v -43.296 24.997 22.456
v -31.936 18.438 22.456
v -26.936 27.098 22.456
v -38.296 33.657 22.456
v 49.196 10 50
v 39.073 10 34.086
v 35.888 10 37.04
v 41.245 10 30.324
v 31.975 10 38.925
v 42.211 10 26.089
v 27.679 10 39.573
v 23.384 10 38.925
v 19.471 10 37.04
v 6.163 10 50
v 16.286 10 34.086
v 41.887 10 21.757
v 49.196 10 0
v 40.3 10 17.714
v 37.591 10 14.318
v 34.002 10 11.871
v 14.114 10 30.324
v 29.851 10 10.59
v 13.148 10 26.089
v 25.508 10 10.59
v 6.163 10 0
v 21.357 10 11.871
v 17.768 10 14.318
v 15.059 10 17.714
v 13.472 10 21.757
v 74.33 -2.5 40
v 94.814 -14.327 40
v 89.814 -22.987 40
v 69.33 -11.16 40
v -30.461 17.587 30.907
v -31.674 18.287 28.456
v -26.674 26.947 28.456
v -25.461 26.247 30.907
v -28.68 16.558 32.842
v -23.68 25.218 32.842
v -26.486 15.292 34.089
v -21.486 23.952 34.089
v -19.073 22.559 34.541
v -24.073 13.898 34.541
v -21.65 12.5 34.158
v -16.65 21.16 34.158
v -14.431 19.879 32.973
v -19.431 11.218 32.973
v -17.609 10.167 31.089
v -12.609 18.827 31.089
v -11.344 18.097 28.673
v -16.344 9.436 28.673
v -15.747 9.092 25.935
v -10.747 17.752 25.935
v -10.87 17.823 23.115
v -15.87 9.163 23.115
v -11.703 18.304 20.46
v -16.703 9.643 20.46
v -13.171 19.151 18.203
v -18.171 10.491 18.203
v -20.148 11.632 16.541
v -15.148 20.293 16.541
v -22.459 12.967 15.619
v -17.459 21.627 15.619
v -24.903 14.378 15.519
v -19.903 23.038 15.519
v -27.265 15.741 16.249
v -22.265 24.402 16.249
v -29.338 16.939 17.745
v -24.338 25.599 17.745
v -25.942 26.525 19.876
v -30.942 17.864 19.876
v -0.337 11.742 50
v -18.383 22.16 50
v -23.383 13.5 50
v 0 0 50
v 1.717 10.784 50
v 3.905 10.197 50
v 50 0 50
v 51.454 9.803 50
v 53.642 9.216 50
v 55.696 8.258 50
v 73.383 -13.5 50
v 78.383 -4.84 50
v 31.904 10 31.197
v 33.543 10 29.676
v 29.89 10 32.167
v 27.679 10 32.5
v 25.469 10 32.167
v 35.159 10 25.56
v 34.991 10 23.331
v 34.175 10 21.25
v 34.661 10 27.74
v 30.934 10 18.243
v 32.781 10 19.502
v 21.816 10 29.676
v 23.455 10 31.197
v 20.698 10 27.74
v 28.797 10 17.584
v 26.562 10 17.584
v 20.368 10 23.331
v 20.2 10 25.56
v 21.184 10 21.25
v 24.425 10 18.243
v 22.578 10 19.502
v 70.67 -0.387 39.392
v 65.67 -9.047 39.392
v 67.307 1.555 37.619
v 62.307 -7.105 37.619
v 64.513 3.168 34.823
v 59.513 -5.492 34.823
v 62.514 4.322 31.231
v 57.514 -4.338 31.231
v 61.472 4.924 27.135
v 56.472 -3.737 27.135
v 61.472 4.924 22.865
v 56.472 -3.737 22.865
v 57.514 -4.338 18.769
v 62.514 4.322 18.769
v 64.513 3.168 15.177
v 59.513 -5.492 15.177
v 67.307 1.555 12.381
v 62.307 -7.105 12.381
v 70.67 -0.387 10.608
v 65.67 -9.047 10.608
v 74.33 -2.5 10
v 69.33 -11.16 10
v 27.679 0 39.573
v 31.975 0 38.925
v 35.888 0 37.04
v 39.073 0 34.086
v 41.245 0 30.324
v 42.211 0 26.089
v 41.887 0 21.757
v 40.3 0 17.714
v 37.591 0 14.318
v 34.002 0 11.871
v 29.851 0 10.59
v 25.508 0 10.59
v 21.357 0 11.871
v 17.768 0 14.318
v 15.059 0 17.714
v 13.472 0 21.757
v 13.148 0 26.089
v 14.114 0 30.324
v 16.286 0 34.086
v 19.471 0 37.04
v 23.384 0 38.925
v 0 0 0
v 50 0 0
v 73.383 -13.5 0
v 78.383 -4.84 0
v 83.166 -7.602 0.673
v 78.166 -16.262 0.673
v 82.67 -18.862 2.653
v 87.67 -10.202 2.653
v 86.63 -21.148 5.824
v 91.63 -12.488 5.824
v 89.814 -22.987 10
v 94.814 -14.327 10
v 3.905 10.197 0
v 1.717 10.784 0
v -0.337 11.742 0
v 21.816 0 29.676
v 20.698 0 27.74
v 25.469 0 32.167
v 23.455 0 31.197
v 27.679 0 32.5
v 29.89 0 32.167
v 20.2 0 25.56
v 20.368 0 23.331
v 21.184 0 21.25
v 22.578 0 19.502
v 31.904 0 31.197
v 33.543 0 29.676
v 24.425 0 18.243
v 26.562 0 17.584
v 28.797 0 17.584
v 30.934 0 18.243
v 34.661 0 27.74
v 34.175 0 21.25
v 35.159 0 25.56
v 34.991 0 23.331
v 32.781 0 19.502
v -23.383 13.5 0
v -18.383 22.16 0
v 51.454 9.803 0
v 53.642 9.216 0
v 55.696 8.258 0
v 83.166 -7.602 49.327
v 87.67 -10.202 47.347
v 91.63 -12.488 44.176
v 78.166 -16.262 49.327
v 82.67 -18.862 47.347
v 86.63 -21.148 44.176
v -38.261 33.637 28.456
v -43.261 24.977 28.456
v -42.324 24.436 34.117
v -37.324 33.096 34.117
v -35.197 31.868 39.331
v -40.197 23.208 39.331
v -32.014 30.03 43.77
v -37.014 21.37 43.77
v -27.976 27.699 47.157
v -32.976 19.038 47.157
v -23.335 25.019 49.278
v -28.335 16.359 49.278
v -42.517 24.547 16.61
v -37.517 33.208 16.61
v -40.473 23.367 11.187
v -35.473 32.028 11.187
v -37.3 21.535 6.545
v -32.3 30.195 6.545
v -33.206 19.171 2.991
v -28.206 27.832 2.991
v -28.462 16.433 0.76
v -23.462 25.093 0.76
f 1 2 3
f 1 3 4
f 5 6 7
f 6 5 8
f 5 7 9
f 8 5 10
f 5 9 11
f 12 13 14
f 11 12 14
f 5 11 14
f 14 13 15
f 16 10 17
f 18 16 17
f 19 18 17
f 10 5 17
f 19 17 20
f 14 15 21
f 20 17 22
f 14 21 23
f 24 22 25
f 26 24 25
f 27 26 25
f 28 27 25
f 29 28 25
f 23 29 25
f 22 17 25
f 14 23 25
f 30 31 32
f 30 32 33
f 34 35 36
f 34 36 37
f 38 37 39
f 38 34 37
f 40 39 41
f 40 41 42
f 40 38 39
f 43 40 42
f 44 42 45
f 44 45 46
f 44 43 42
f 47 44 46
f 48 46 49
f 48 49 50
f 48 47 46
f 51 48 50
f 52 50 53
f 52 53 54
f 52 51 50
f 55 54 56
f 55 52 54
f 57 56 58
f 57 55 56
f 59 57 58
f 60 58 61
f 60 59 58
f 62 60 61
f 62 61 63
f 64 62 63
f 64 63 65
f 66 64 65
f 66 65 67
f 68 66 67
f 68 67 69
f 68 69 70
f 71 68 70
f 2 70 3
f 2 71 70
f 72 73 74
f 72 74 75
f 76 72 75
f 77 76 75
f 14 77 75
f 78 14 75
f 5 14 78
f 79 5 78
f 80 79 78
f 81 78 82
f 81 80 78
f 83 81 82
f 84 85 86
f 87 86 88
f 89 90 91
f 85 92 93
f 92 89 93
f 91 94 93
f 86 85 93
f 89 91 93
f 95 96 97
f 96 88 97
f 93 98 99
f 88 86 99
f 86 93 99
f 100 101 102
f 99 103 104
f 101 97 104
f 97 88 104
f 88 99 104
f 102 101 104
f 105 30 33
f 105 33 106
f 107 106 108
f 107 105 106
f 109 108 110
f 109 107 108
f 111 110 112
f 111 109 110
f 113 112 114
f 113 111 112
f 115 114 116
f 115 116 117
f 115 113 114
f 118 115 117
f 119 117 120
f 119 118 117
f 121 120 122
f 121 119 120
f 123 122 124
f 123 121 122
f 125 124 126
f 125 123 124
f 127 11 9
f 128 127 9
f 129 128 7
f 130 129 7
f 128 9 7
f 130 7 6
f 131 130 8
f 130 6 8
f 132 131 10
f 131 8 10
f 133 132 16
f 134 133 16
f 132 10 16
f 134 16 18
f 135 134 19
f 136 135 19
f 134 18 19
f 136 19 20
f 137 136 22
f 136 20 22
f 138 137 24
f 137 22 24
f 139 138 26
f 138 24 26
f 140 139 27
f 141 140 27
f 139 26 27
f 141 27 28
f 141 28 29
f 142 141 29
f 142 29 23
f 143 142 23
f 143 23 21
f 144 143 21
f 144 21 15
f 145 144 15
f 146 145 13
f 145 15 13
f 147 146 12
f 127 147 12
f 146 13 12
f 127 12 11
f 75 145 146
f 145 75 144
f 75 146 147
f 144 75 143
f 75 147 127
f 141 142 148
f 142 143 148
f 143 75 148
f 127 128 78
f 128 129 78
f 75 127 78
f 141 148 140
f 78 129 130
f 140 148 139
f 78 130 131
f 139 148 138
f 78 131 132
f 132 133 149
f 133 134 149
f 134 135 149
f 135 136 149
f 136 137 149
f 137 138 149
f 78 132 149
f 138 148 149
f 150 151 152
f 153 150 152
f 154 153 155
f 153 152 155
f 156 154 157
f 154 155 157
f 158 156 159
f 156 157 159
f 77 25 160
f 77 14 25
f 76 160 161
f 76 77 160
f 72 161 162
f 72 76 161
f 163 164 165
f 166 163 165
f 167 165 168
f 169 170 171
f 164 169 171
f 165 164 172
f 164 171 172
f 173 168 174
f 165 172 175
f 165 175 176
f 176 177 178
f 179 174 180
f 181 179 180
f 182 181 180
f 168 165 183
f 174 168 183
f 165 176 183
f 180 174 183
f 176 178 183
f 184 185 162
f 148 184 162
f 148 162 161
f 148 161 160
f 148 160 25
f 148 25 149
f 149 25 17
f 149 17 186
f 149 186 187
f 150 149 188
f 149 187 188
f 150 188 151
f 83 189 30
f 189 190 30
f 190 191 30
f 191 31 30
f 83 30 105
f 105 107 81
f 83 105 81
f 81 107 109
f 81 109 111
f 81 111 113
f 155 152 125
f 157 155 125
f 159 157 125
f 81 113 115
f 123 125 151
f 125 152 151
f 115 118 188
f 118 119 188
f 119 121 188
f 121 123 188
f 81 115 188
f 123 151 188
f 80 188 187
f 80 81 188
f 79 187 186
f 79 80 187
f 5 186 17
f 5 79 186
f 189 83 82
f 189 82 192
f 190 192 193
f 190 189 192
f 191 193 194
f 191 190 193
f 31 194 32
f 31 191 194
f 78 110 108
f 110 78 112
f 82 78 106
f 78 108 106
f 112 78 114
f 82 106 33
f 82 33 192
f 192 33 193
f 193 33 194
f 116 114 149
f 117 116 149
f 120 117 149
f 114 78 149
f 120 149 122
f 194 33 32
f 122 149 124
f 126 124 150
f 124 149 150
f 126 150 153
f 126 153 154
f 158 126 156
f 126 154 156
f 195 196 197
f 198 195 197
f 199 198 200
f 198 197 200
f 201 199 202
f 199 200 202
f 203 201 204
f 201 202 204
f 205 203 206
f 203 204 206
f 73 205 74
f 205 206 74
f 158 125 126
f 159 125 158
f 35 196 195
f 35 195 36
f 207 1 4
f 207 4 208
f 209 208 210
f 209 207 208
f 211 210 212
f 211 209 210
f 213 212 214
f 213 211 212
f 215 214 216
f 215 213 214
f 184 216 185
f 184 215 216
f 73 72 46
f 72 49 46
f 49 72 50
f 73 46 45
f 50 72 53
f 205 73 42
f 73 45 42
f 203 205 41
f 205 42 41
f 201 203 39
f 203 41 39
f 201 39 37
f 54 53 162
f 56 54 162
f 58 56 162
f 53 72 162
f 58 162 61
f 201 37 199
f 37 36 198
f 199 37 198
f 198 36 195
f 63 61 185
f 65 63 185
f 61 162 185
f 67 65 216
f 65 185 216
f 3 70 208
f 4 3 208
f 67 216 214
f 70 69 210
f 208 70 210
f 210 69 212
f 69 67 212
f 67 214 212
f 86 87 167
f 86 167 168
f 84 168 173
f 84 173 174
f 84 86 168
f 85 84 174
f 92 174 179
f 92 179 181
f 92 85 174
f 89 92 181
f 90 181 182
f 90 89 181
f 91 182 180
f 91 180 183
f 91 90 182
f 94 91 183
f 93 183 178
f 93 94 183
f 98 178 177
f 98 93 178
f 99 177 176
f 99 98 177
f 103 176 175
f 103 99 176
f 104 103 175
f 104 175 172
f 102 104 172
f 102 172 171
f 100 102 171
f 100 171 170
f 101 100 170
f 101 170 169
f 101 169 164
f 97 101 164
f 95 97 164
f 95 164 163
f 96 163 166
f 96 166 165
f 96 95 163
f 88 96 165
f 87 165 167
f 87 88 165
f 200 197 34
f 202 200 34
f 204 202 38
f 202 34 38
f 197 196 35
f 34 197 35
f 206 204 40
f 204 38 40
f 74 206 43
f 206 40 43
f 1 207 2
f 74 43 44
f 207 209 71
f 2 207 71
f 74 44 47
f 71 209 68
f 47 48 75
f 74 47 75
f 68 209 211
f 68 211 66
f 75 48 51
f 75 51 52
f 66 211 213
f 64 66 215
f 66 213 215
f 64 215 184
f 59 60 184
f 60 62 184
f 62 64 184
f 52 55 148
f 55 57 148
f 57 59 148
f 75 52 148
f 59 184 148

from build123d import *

# Parameters (mm, degrees)
EXTRUDE_THIN1_DEPTH = 50
FILLET1_R           = 23
CUT_EXTRUDE1_START  = -10
SKETCH2_R           = 9.542038154
CUT_EXTRUDE1_DEPTH  = 10
FILLET2_R           = 23
CUT_EXTRUDE2_DEPTH  = 10
SKETCH5_R           = 14.57250647
SKETCH5_R_2         = 7.5
CUT_EXTRUDE3_DEPTH  = 10
FILLET3_R           = 13


with BuildPart() as part:
    # Sketch1 → Extrude-Thin1 (new body)
    with BuildSketch(Plane.XY):
        Polygon((-43.301270189, 25), (0, 0), (50, 0), (93.301270189, -25), (98.301270189, -16.339745962), (52.679491924, 10), (2.679491924, 10), (-38.301270189, 33.660254038), align=None)
    extrude(amount=EXTRUDE_THIN1_DEPTH)

    # Fillet1
    fillet1_edges = [part.edges().sort_by_distance(p)[0] for p in [
        (-40.801270189, 29.330127019, 50),
        (-40.801270189, 29.330127019, 0),
    ]]
    fillet(fillet1_edges, radius=FILLET1_R)

    # Sketch2 → Cut-Extrude1 (cut)
    with BuildSketch(Plane(origin=(5, 8.660254038, 0), x_dir=(0.8660254037844417, -0.4999999999999947, 0), z_dir=(0.4999999999999947, 0.8660254037844417, 0)).offset(CUT_EXTRUDE1_START)):
        with Locations((-27.679491924, -25)):
            Circle(SKETCH2_R)
        with BuildLine():
            Line((-49.953885583, -28.455725473), (-36.57378524, -28.455725473))
            ThreePointArc((-36.57378524, -28.455725473), (-37.209442685, -25.480136062), (-36.876076033, -22.455725473))
            Line((-36.876076033, -22.455725473), (-49.993559212, -22.455725473))
            ThreePointArc((-49.993559212, -22.455725473), (-49.998389747, -22.727843683), (-50, -23))
            Line((-50, -23), (-50, -27))
            ThreePointArc((-50, -27), (-49.988468505, -27.728227848), (-49.953885583, -28.455725473))
        make_face()
    extrude(amount=CUT_EXTRUDE1_DEPTH, mode=Mode.SUBTRACT)

    # Fillet2
    fillet2_edges = [part.edges().sort_by_distance(p)[0] for p in [
        (95.801270189, -20.669872981, 50),
        (95.801270189, -20.669872981, 0),
    ]]
    fillet(fillet2_edges, radius=FILLET2_R)

    # Sketch4 → Cut-Extrude2 (cut)
    with BuildSketch(Plane(origin=(17.5, 30.310889132, 0), x_dir=(0.8660254037844382, -0.500000000000001, 0), z_dir=(0.500000000000001, 0.8660254037844382, 0))):
        with BuildLine():
            Line((65.621778265, -10), (93.301270189, -10))
            ThreePointArc((93.301270189, -10), (108.301270189, -25), (93.301270189, -40))
            Line((93.301270189, -40), (65.621778265, -40))
            ThreePointArc((65.621778265, -40), (50.621778265, -25), (65.621778265, -10))
        make_face()
    extrude(amount=-CUT_EXTRUDE2_DEPTH, mode=Mode.SUBTRACT)

    # Sketch5 → Cut-Extrude3 (cut)
    with BuildSketch(Plane(origin=(0, 10, 0), x_dir=(1, 0, 0), z_dir=(0, 1, 0))):
        with Locations(Location((27.679491924, -25, 0), (0, 0, 270))):
            Circle(SKETCH5_R)
        with Locations(Location((27.679491924, -25, 0), (0, 0, 270))):
            Circle(SKETCH5_R_2, mode=Mode.SUBTRACT)
    extrude(amount=-CUT_EXTRUDE3_DEPTH, mode=Mode.SUBTRACT)


with BuildPart() as cut_extrude3_piece_1:
    # of the separate pieces the step leaves, piece 1, a body of its own (cut_extrude3_pieces)
    add(part.part.solids().sort_by_distance((73.382685902, -13.5, 0))[0])

    # Fillet3
    fillet3_edges = [cut_extrude3_piece_1.edges().sort_by_distance(p)[0] for p in [
        (2.679491924, 10, 25),
        (52.679491924, 10, 25),
    ]]
    fillet(fillet3_edges, radius=FILLET3_R)


with BuildPart() as cut_extrude3_piece_2:
    # of the separate pieces the step leaves, piece 2, a body of its own (cut_extrude3_pieces)
    add(part.part.solids().sort_by_distance((27.679491924, 0, 32.5))[0])


solid = Compound([cut_extrude3_piece_1.part, cut_extrude3_piece_2.part])
